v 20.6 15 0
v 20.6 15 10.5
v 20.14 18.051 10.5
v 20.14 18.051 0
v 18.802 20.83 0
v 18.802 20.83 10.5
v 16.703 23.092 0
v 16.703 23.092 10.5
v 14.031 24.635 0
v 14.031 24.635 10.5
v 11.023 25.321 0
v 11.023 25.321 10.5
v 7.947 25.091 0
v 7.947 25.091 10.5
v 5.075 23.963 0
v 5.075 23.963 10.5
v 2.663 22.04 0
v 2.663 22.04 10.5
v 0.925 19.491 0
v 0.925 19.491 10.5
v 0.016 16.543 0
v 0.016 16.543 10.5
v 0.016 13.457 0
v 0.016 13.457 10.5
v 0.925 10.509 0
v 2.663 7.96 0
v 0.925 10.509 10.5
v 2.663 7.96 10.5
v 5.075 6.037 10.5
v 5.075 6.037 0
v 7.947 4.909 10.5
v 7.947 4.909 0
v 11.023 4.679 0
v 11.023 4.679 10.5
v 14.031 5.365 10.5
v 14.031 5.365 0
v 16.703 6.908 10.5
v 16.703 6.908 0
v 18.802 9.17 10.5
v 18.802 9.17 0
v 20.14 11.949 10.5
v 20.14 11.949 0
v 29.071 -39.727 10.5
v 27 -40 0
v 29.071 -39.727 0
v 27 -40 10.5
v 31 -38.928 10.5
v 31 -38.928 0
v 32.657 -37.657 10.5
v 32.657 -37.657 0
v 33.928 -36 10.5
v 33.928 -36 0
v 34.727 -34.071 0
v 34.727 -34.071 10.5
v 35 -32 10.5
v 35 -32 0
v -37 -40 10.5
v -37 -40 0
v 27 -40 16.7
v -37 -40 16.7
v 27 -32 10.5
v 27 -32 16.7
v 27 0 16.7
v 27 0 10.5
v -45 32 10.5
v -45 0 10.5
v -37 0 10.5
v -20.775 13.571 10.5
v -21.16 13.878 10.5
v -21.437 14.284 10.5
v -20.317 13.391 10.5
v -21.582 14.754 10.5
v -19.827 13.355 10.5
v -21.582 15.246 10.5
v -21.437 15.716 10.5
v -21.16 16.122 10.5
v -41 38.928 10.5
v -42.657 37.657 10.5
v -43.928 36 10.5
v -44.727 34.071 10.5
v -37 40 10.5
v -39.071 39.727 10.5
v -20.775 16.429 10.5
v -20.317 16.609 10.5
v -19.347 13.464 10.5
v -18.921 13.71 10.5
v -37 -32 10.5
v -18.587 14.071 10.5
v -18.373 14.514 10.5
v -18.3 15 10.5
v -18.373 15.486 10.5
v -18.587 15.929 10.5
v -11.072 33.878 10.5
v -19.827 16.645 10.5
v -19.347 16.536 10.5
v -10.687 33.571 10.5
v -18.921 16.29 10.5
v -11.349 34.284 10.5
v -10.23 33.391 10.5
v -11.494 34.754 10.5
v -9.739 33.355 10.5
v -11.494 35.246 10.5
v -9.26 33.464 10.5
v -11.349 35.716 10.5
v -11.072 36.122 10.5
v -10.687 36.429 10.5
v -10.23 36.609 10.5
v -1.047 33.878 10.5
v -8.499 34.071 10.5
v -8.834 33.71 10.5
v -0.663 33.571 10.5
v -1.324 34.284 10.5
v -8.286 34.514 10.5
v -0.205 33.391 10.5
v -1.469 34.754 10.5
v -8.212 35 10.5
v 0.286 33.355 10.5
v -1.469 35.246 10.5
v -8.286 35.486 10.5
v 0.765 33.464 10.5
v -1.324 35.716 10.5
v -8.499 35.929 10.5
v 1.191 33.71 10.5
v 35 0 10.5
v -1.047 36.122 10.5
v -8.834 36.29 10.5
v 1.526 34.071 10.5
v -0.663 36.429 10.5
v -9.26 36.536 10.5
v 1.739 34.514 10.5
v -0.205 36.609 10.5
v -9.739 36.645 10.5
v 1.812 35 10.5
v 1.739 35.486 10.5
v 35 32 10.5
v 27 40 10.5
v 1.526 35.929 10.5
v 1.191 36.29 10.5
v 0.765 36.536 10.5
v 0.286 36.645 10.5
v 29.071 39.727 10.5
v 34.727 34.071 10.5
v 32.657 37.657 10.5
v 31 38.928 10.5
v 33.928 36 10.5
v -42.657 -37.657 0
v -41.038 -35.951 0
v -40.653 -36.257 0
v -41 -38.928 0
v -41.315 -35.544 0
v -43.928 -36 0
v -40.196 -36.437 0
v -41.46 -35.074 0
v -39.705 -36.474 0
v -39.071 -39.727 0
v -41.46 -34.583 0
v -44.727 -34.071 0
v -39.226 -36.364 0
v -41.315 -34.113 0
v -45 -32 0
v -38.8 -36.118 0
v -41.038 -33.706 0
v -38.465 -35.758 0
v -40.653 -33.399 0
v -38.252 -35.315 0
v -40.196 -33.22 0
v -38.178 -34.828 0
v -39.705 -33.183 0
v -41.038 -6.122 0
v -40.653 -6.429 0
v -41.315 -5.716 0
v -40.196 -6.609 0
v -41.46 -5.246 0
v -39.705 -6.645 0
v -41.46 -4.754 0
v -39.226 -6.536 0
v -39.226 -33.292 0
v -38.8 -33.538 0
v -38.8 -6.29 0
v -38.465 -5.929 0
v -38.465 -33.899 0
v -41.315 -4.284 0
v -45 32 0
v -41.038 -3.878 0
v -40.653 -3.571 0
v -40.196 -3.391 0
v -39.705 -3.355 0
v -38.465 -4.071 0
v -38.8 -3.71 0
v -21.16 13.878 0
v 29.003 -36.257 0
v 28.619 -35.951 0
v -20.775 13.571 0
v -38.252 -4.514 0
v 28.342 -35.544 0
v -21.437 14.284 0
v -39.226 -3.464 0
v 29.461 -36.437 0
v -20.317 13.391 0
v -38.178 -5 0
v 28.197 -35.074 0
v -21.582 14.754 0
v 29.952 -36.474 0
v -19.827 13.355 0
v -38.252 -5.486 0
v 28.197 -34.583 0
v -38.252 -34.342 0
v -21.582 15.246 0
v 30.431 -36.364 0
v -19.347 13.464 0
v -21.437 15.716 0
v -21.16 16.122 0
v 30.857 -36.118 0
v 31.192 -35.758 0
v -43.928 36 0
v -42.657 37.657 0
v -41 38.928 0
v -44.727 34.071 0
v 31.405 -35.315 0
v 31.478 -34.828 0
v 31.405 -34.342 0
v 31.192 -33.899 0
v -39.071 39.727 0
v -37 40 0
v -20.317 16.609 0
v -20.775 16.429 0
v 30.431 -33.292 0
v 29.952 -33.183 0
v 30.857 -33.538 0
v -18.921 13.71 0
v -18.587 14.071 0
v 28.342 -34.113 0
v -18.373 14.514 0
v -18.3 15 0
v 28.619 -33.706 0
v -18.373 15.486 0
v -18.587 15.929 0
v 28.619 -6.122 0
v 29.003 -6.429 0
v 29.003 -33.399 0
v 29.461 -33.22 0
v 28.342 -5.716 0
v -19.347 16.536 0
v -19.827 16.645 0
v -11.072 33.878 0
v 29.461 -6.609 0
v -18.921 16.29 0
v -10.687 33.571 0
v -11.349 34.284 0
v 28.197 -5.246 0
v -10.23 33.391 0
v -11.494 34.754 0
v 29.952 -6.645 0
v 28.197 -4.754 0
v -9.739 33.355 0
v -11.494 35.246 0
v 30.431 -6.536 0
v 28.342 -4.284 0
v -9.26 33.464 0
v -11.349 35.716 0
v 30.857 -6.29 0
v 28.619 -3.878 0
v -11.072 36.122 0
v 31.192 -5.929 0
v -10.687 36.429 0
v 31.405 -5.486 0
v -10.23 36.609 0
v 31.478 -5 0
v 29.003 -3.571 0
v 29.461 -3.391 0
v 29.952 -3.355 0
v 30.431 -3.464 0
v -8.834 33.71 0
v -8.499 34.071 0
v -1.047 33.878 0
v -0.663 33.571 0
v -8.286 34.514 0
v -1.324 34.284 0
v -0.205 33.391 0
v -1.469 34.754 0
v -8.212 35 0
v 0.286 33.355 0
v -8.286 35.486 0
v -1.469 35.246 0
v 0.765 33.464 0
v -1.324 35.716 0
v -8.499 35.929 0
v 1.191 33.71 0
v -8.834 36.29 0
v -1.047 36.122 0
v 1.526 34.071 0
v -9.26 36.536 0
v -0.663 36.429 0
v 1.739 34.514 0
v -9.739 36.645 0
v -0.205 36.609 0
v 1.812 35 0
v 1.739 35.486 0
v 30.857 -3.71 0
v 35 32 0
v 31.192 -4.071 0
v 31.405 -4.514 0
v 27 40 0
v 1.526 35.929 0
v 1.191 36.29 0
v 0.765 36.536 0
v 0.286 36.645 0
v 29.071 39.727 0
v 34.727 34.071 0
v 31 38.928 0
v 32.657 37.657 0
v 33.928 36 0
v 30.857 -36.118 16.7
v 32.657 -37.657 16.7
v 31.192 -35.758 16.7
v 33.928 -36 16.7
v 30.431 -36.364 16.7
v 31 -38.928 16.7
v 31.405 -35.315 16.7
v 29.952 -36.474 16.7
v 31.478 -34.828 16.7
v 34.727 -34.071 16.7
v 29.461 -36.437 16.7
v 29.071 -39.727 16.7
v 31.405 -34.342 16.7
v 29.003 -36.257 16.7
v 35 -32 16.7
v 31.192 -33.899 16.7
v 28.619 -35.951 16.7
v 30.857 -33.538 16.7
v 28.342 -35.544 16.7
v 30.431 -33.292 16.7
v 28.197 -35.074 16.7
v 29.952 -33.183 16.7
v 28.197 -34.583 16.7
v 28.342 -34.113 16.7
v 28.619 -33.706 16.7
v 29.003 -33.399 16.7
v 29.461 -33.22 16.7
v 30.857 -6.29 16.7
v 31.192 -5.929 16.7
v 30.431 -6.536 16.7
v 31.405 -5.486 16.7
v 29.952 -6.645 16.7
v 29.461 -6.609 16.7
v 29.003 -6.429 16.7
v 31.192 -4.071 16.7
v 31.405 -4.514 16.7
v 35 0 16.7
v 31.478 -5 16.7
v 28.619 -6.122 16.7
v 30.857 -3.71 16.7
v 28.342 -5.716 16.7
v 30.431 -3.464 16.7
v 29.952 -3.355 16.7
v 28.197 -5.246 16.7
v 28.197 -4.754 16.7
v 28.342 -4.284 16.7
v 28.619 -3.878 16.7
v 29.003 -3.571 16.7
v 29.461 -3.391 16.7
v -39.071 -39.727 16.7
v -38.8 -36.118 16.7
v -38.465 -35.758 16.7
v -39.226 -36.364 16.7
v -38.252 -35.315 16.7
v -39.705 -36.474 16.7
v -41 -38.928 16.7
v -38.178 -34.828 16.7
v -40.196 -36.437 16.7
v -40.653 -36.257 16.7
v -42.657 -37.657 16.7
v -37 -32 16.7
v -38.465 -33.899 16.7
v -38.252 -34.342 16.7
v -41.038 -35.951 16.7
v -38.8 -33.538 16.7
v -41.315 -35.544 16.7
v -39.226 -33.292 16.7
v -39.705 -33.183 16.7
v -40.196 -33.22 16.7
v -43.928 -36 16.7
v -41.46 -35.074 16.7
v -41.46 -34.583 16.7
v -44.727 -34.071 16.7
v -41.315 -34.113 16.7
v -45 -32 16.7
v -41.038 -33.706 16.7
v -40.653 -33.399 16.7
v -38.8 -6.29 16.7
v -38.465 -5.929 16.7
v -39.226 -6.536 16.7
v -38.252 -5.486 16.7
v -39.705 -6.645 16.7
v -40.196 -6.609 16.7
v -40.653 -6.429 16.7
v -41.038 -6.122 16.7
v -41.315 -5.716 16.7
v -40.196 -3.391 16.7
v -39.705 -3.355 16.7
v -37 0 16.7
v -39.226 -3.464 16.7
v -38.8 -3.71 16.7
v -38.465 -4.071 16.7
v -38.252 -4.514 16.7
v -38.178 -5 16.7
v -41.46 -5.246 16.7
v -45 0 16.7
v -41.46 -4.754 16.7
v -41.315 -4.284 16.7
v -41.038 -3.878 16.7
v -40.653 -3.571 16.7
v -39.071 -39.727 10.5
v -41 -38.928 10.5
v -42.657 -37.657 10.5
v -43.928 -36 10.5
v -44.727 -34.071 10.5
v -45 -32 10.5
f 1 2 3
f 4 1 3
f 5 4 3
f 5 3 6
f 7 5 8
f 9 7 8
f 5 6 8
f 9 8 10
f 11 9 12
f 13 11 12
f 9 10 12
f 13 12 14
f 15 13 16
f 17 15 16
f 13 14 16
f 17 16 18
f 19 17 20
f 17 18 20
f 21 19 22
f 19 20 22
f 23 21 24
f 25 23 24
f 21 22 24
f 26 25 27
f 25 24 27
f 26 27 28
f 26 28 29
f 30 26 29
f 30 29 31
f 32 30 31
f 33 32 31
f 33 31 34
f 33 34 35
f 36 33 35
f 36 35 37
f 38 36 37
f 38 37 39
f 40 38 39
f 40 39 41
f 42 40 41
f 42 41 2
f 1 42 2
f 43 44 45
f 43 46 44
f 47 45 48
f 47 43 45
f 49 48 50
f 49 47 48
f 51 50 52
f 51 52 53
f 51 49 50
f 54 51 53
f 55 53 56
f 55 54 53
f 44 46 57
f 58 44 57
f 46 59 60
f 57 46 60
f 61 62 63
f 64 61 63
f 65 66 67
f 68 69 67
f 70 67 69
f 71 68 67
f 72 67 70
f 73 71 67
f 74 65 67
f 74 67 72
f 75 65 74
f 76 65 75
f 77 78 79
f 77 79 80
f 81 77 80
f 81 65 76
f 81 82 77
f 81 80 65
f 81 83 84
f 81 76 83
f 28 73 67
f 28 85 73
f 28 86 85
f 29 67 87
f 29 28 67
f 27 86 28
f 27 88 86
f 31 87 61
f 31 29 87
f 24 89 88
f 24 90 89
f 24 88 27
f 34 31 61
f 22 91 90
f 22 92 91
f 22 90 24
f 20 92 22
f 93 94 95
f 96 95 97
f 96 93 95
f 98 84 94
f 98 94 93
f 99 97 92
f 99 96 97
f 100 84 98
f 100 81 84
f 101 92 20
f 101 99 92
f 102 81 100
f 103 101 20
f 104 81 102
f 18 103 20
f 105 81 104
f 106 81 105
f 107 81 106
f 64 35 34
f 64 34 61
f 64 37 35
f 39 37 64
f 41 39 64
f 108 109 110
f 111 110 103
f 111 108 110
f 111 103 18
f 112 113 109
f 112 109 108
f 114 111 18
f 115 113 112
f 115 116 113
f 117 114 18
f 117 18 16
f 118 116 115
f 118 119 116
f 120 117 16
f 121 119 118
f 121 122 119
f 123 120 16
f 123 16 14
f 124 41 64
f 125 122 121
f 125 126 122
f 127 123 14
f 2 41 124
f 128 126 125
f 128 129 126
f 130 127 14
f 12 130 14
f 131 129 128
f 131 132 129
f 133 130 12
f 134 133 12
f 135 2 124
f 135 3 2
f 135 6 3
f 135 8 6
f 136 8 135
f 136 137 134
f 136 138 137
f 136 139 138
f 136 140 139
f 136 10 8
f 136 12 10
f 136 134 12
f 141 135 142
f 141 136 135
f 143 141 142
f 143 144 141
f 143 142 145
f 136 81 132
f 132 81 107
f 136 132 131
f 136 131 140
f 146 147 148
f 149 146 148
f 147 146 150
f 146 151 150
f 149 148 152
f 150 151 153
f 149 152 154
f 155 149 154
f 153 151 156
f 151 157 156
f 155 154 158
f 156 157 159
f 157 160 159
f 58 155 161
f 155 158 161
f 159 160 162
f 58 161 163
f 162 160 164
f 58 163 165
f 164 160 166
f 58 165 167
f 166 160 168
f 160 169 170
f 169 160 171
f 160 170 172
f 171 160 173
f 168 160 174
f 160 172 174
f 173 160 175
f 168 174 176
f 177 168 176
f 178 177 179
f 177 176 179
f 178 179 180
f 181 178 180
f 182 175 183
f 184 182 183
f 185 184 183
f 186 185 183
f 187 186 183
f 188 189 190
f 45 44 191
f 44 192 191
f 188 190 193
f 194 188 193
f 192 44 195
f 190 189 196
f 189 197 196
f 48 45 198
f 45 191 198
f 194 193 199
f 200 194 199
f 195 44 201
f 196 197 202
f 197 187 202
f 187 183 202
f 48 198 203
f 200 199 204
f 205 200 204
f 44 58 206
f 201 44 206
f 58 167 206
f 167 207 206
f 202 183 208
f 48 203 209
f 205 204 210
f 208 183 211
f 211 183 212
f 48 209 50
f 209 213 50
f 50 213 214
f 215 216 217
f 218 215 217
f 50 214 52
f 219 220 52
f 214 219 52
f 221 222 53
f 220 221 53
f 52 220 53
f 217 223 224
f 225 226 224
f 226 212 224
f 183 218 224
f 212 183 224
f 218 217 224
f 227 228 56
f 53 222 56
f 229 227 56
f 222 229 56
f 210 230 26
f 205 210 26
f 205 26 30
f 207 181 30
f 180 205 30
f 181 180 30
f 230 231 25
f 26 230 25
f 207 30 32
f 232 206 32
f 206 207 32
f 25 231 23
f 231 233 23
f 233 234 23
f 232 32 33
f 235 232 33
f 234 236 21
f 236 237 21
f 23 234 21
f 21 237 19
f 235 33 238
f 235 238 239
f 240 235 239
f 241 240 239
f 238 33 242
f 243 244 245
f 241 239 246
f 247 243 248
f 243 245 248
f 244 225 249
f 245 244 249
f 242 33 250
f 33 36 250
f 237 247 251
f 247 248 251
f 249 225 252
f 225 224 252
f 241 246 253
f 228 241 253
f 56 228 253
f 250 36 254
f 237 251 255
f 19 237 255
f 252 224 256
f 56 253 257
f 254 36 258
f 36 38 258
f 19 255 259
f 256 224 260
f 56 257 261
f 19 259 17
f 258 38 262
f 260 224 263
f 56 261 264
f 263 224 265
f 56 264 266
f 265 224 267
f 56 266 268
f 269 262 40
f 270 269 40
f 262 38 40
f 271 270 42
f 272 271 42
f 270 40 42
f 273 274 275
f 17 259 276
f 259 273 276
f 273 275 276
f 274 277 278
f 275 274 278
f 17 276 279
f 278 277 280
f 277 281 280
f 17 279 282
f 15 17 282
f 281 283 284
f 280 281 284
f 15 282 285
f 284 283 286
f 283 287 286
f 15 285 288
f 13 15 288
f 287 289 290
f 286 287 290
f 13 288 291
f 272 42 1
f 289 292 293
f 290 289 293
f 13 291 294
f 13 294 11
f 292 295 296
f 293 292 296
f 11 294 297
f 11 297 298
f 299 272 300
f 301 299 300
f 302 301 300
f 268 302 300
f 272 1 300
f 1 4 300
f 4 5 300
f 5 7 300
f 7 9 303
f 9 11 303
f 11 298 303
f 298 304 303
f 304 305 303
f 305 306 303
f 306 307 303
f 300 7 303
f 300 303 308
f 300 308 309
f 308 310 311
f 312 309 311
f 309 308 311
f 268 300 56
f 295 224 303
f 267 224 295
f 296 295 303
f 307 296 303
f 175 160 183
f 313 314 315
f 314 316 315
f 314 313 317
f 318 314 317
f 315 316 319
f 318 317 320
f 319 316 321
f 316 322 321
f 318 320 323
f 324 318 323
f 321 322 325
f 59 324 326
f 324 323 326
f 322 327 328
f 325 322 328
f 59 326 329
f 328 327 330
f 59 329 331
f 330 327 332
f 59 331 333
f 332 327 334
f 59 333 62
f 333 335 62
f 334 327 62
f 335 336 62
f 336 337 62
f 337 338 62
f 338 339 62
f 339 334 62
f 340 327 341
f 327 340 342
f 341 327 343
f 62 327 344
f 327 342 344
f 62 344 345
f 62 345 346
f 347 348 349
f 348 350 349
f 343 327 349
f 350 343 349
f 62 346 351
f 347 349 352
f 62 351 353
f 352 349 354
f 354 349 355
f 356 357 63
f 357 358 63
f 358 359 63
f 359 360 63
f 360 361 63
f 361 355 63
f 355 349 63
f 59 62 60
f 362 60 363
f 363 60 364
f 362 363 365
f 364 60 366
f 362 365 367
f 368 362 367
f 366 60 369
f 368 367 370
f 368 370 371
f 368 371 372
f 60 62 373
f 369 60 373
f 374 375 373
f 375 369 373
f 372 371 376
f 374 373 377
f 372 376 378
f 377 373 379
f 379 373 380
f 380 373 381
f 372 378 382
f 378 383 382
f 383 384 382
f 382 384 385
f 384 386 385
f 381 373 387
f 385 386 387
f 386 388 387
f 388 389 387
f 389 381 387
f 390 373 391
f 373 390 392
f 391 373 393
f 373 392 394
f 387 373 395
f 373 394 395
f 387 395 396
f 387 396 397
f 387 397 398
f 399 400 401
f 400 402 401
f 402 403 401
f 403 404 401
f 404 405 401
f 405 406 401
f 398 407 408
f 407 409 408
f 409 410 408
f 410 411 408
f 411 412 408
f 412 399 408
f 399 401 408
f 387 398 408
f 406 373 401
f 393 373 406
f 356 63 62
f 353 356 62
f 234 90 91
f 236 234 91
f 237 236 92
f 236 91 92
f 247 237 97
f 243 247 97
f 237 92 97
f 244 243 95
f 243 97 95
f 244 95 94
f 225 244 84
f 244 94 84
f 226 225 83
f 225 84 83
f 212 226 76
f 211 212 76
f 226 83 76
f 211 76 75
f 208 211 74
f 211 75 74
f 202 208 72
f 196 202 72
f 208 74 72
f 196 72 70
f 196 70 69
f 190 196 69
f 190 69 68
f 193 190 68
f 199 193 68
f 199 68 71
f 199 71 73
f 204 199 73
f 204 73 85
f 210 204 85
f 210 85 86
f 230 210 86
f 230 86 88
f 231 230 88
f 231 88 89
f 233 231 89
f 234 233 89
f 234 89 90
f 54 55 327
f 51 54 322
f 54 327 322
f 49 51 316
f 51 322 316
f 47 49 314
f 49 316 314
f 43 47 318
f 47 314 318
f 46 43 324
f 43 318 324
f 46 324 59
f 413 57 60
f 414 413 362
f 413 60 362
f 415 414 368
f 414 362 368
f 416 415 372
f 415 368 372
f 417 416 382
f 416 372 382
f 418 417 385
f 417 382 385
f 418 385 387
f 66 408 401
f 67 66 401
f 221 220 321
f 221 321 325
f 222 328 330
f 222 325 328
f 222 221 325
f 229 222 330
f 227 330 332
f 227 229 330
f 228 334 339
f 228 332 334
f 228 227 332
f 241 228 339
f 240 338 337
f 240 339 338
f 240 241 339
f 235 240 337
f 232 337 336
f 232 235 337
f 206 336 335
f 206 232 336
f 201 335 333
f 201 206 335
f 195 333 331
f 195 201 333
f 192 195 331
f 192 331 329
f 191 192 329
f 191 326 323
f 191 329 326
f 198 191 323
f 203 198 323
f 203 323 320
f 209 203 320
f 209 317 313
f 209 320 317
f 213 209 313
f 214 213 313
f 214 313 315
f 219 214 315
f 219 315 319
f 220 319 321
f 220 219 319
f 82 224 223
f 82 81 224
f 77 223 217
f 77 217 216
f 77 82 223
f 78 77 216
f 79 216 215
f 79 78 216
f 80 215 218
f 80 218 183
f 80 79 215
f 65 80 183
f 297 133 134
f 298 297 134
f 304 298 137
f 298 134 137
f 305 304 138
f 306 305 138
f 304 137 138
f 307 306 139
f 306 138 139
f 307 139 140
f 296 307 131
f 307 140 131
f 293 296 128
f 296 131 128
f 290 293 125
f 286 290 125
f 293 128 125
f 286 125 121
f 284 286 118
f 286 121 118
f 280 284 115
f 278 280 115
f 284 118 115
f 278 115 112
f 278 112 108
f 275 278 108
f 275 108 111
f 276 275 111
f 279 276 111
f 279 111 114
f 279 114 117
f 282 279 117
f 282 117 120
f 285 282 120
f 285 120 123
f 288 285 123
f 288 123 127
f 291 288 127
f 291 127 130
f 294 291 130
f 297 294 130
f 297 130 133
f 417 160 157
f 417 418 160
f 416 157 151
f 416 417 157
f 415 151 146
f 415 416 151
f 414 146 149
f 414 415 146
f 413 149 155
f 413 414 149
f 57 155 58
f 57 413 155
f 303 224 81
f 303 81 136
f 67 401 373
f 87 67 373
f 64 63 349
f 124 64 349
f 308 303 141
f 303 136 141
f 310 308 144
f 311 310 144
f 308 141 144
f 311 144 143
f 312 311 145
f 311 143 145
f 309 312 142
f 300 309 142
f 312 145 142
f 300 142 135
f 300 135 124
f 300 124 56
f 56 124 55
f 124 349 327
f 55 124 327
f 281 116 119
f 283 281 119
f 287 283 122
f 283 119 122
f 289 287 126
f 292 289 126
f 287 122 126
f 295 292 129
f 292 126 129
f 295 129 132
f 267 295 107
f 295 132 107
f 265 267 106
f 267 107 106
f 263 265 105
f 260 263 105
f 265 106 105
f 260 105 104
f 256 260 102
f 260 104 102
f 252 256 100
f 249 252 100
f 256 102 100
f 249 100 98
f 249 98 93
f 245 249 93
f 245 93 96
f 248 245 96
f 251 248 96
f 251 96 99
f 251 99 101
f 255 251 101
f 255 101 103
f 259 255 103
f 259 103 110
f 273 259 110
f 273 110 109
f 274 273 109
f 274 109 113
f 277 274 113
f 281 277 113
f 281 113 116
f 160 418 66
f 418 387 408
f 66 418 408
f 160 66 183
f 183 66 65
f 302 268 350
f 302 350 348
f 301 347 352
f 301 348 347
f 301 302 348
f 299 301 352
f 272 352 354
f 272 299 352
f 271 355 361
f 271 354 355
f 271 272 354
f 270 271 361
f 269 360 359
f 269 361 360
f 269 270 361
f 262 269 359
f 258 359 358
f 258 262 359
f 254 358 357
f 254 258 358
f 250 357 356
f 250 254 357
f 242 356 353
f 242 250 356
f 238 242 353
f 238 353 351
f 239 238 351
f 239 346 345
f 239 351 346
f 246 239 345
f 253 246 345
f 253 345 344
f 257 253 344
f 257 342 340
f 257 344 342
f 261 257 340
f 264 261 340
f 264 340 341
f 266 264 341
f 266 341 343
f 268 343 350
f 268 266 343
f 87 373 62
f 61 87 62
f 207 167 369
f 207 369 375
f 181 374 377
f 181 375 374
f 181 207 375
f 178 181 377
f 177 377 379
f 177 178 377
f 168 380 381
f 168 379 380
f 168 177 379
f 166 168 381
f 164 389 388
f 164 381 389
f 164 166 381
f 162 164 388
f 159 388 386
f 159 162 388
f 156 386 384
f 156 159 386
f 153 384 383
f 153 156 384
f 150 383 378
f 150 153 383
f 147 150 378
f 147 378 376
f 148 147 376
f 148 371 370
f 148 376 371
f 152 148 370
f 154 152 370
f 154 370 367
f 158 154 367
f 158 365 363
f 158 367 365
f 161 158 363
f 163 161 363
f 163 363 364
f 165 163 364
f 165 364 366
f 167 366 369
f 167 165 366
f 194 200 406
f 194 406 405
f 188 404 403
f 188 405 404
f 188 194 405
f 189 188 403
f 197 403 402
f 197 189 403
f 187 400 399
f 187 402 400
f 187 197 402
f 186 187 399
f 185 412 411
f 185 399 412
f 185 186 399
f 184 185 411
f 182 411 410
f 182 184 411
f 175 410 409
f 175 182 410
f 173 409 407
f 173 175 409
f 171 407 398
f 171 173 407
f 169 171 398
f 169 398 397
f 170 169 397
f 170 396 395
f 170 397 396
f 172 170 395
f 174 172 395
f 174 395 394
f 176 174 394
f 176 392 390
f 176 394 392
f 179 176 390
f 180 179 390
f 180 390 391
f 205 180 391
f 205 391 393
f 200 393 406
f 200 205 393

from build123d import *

# Parameters (mm, degrees)
SKETCH_1_W               = 80
SKETCH_1_H               = 80
EXTRUDE_1_DEPTH          = 10.5
SKETCH_3_R               = 1.65
SKETCH_3_R_2             = 10.35
CUT_EXTRUDE_1_DEPTH      = 62.116691664
FILLET_3_R               = 8
FILLET_4_R               = 8
FILLET_5_R               = 8
FILLET_6_R               = 8
EXTRUDE_START            = 6.2
EXTRUDE_2_DEPTH          = 6.2
CUT_EXTRUDE_2_DEPTH      = 62.116691664
CUT_EXTRUDE_2_DEPTH_BACK = 62.116691664
SKETCH_12_R              = 1.65


with BuildPart() as part:
    # 草图1 → 凸台-拉伸1 (new body)
    with BuildSketch(Plane.XY):
        with Locations((-5, 0)):
            Rectangle(SKETCH_1_W, SKETCH_1_H)
    extrude(amount=EXTRUDE_1_DEPTH)

    # 草图3 → 切除-拉伸1 (cut, through all)
    with BuildSketch(Plane.XY.offset(10.5)):
        with Locations((-19.95, 15)):
            Circle(SKETCH_3_R)
        with Locations((-9.86238383, 35)):
            Circle(SKETCH_3_R)
        with Locations((0.16238383, 35)):
            Circle(SKETCH_3_R)
        with Locations((10.25, 15)):
            Circle(SKETCH_3_R_2)
    extrude(amount=-CUT_EXTRUDE_1_DEPTH, mode=Mode.SUBTRACT)

    # 圆角3
    fillet_3_edges = [part.edges().sort_by_distance(p)[0] for p in [
        (35, 40, 5.25),
    ]]
    fillet(fillet_3_edges, radius=FILLET_3_R)

    # 圆角4
    fillet_4_edges = [part.edges().sort_by_distance(p)[0] for p in [
        (-45, 40, 5.25),
    ]]
    fillet(fillet_4_edges, radius=FILLET_4_R)

    # 圆角5
    fillet_5_edges = [part.edges().sort_by_distance(p)[0] for p in [
        (-45, -40, 5.25),
    ]]
    fillet(fillet_5_edges, radius=FILLET_5_R)

    # 圆角6
    fillet_6_edges = [part.edges().sort_by_distance(p)[0] for p in [
        (35, -40, 5.25),
    ]]
    fillet(fillet_6_edges, radius=FILLET_6_R)

    # 草图11 → 凸台-拉伸2 (add)
    with BuildSketch(Plane.XY.offset(10.5).offset(EXTRUDE_START)):
        with BuildLine():
            Line((-45, 0), (-37, 0))
            Line((-37, 0), (-37, -32))
            Line((-37, -32), (27, -32))
            Line((27, -32), (27, 0))
            Line((27, 0), (35, 0))
            Line((35, 0), (35, -32))
            ThreePointArc((35, -32), (32.656854249, -37.656854249), (27, -40))
            Line((27, -40), (-37, -40))
            ThreePointArc((-37, -40), (-42.656854249, -37.656854249), (-45, -32))
            Line((-45, -32), (-45, 0))
        make_face()
    extrude(amount=-EXTRUDE_2_DEPTH)

    # 草图12 → 切除-拉伸2 (cut, two sides: drawn at the far end of the back side and taken through both)
    with BuildSketch(Plane.XY.offset(10.5).offset(-CUT_EXTRUDE_2_DEPTH_BACK)):
        with Locations((29.828427125, -34.828427125)):
            Circle(SKETCH_12_R)
        with Locations((-39.828427125, -34.828427125)):
            Circle(SKETCH_12_R)
        with Locations((-39.828427125, -5)):
            Circle(SKETCH_12_R)
        with Locations((29.828427125, -5)):
            Circle(SKETCH_12_R)
    extrude(amount=CUT_EXTRUDE_2_DEPTH + CUT_EXTRUDE_2_DEPTH_BACK, mode=Mode.SUBTRACT)


solid = part.part
